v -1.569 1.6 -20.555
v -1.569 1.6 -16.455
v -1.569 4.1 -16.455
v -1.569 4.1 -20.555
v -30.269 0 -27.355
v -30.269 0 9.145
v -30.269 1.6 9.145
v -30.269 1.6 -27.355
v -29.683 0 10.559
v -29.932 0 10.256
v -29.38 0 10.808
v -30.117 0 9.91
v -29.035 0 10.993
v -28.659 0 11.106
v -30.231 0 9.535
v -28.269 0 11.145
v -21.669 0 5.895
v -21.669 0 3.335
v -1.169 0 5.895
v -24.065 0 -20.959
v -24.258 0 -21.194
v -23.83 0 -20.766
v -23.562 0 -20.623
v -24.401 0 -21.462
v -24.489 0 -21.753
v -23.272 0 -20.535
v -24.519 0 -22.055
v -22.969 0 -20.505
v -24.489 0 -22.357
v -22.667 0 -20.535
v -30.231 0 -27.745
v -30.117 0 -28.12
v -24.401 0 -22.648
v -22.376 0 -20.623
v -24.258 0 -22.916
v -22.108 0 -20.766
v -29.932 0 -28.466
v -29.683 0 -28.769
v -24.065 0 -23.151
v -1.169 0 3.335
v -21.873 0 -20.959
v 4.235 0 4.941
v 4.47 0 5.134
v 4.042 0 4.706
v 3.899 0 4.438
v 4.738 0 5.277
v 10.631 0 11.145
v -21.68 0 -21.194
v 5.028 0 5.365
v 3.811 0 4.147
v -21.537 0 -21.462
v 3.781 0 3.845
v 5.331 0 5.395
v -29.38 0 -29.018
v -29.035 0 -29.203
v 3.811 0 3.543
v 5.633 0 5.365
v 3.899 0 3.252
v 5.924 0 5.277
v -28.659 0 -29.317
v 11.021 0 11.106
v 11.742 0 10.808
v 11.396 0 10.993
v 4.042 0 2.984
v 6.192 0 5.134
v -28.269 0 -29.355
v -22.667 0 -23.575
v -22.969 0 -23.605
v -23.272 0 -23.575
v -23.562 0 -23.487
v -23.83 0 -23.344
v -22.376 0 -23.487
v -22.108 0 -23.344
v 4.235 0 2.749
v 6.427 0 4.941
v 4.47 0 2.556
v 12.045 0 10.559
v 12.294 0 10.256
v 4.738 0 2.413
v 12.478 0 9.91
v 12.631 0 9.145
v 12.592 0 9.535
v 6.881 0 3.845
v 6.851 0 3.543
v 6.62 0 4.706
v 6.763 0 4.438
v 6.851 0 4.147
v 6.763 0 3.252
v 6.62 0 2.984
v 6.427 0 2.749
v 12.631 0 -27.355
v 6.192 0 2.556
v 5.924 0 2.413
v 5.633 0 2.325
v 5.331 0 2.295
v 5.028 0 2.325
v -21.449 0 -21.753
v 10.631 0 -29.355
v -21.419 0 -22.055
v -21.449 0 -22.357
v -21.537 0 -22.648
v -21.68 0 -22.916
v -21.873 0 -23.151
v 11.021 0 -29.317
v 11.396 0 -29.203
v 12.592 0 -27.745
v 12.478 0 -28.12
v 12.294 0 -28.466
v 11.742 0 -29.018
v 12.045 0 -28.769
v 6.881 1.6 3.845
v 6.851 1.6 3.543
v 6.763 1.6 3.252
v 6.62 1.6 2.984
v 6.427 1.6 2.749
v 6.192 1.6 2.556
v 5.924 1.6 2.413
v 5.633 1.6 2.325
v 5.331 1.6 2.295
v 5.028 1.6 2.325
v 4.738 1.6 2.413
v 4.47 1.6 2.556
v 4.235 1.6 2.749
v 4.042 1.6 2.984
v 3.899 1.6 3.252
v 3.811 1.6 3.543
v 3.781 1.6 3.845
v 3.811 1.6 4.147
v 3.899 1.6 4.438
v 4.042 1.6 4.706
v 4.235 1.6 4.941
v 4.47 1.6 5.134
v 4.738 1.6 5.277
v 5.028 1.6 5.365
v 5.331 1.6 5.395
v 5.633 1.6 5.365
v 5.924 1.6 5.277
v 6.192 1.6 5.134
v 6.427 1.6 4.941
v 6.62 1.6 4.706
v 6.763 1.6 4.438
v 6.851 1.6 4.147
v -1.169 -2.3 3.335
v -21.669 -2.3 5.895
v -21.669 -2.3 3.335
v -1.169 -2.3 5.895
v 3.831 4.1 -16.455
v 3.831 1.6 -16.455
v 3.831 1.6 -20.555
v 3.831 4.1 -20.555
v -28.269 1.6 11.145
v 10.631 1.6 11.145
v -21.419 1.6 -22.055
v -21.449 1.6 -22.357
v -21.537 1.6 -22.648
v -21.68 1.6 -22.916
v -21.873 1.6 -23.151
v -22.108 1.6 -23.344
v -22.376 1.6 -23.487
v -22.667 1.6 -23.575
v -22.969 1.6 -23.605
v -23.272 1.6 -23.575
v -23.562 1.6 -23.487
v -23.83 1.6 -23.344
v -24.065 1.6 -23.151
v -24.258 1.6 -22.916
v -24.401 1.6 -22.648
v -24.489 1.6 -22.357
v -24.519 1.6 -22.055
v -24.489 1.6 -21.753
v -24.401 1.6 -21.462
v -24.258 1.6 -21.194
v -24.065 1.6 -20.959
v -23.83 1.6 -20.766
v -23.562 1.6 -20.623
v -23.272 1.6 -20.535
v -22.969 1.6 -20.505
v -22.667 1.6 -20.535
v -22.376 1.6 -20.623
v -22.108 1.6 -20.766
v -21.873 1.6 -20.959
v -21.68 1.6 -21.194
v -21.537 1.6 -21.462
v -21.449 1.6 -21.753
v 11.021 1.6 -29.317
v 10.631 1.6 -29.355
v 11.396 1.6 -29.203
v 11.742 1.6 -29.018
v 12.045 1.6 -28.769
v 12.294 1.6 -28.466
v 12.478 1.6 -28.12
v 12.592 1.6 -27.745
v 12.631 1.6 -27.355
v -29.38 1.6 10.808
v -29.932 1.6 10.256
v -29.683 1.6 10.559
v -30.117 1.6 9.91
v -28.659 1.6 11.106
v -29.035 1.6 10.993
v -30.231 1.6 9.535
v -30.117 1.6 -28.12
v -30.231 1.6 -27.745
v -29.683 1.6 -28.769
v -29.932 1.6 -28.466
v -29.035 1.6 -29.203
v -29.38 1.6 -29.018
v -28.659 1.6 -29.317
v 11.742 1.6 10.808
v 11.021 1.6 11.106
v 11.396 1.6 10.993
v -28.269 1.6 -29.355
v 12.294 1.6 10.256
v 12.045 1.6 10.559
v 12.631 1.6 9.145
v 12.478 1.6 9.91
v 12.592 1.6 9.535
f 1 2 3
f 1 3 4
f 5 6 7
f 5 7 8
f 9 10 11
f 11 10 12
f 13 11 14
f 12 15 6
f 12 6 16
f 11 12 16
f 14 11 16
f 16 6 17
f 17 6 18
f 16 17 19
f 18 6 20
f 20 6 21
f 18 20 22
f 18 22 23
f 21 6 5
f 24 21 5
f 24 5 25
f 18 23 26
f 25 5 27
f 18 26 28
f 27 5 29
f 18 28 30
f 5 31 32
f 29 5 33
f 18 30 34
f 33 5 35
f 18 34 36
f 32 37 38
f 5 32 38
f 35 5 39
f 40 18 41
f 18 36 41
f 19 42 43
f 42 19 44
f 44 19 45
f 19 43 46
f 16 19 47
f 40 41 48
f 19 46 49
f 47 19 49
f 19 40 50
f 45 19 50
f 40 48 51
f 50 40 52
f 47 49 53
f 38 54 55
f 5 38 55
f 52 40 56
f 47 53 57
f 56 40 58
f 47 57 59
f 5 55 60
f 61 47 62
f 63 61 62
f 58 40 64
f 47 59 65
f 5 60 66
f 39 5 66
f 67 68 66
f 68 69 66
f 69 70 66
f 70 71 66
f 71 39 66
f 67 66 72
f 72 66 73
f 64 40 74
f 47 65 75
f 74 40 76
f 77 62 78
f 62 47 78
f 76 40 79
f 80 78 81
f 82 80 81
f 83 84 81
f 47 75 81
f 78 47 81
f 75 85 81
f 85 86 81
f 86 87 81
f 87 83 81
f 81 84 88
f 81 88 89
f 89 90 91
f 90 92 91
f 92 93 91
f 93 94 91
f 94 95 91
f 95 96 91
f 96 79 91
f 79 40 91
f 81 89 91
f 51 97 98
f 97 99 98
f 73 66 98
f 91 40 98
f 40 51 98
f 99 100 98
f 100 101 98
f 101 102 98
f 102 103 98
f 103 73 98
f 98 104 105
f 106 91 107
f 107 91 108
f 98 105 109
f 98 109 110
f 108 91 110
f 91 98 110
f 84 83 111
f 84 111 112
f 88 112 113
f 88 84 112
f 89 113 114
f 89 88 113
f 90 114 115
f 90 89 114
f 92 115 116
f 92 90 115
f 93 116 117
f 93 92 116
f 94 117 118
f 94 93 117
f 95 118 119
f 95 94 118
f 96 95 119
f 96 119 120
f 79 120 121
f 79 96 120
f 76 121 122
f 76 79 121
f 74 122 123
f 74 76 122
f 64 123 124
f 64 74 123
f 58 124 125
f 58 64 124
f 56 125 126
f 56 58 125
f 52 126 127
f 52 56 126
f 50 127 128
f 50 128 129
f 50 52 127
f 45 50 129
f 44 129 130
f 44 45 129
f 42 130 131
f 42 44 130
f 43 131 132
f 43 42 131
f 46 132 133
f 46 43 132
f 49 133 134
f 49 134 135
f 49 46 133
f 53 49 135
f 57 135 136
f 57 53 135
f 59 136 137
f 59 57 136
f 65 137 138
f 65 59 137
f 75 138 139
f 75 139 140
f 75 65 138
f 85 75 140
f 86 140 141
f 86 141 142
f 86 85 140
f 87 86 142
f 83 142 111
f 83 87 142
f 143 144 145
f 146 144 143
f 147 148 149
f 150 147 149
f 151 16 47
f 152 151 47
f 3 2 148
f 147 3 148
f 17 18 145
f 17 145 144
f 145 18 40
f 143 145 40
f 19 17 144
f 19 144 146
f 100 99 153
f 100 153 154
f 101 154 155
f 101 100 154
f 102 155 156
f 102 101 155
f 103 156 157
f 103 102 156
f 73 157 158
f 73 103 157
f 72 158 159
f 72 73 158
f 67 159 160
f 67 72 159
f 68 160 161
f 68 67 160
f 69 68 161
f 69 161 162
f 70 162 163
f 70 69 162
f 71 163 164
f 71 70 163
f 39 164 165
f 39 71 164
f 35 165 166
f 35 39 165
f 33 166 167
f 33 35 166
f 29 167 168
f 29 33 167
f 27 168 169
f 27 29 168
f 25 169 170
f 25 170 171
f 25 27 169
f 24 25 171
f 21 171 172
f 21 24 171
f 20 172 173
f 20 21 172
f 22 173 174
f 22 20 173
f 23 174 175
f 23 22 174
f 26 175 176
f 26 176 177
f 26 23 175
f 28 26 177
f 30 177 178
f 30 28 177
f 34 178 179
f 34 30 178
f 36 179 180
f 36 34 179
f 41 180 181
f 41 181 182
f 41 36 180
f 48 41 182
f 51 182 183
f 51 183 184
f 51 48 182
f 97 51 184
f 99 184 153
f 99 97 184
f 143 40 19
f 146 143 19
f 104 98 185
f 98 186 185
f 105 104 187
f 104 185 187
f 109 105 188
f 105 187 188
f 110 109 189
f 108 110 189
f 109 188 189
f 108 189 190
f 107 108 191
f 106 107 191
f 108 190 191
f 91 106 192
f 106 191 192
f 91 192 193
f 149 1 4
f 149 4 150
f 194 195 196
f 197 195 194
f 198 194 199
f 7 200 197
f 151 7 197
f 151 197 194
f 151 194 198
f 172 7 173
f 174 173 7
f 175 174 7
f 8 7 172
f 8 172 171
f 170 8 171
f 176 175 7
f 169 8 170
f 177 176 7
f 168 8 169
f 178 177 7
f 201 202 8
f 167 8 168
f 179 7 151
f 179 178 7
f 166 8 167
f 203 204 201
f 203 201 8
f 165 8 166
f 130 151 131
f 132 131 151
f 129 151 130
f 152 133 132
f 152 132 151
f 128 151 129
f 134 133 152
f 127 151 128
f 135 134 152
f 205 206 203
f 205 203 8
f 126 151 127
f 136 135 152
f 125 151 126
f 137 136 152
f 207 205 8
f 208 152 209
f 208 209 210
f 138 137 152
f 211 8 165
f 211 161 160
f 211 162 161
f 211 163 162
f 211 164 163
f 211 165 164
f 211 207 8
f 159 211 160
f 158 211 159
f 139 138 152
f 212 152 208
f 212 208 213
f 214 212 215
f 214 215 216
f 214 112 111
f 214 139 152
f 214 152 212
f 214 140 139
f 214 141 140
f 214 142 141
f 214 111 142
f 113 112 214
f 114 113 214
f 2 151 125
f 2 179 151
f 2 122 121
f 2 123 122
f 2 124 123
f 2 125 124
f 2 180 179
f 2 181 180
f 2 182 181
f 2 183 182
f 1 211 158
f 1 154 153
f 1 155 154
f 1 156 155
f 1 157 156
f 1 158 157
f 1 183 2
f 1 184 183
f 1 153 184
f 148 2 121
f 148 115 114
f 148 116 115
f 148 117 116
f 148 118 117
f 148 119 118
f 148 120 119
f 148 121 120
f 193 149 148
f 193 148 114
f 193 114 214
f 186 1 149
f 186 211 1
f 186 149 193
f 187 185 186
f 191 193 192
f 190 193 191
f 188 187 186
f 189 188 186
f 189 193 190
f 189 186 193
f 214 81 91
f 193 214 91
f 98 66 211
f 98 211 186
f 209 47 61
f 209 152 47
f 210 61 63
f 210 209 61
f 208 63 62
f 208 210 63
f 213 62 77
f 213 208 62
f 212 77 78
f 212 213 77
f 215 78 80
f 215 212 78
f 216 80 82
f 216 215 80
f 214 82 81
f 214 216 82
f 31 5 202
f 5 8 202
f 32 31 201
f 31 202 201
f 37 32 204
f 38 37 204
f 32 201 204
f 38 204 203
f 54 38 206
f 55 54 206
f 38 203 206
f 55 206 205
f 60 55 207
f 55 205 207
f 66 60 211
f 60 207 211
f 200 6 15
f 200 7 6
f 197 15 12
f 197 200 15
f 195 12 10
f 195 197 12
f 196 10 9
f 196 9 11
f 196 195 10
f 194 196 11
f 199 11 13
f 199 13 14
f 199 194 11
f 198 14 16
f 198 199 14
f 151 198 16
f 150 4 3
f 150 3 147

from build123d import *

# Parameters (mm, degrees)
SKETCH1_W           = 42.9
SKETCH1_H           = 40.5
SKETCH1_R           = 1.55
BOSS_EXTRUDE1_DEPTH = 1.6
FILLET1_R           = 2
SKETCH2_W           = 5.4
SKETCH2_H           = 4.1
BOSS_EXTRUDE2_DEPTH = 2.5
SKETCH3_W           = 20.5
SKETCH3_H           = 2.56
BOSS_EXTRUDE3_DEPTH = 2.3


with BuildPart() as part:
    # Sketch1 → Boss-Extrude1 (new body)
    with BuildSketch(Plane(origin=(0, 0, 0), x_dir=(1, 0, 0), z_dir=(0, 1, 0))):
        with Locations((-8.819274306, 9.105101592)):
            Rectangle(SKETCH1_W, SKETCH1_H)
        with Locations((-22.969274306, 22.055101592)):
            Circle(SKETCH1_R, mode=Mode.SUBTRACT)
        with Locations((5.330725694, -3.844898408)):
            Circle(SKETCH1_R, mode=Mode.SUBTRACT)
    extrude(amount=BOSS_EXTRUDE1_DEPTH)

    # Fillet1
    fillet1_edges = [part.edges().sort_by_distance(p)[0] for p in [
        (-30.269274306, 0.8, -29.355101592),
        (12.630725694, 0.8, -29.355101592),
        (12.630725694, 0.8, 11.144898408),
        (-30.269274306, 0.8, 11.144898408),
    ]]
    fillet(fillet1_edges, radius=FILLET1_R)

    # Sketch2 → Boss-Extrude2 (add)
    with BuildSketch(Plane(origin=(0, 1.6, 0), x_dir=(1, 0, 0), z_dir=(0, 1, 0))):
        with Locations((1.130725694, 18.505101592)):
            Rectangle(SKETCH2_W, SKETCH2_H)
    extrude(amount=BOSS_EXTRUDE2_DEPTH)

    # Sketch3 → Boss-Extrude3 (add)
    with BuildSketch(Plane.XZ):
        with Locations((-11.419274306, 4.614898408)):
            Rectangle(SKETCH3_W, SKETCH3_H)
    extrude(amount=BOSS_EXTRUDE3_DEPTH)


solid = part.part
